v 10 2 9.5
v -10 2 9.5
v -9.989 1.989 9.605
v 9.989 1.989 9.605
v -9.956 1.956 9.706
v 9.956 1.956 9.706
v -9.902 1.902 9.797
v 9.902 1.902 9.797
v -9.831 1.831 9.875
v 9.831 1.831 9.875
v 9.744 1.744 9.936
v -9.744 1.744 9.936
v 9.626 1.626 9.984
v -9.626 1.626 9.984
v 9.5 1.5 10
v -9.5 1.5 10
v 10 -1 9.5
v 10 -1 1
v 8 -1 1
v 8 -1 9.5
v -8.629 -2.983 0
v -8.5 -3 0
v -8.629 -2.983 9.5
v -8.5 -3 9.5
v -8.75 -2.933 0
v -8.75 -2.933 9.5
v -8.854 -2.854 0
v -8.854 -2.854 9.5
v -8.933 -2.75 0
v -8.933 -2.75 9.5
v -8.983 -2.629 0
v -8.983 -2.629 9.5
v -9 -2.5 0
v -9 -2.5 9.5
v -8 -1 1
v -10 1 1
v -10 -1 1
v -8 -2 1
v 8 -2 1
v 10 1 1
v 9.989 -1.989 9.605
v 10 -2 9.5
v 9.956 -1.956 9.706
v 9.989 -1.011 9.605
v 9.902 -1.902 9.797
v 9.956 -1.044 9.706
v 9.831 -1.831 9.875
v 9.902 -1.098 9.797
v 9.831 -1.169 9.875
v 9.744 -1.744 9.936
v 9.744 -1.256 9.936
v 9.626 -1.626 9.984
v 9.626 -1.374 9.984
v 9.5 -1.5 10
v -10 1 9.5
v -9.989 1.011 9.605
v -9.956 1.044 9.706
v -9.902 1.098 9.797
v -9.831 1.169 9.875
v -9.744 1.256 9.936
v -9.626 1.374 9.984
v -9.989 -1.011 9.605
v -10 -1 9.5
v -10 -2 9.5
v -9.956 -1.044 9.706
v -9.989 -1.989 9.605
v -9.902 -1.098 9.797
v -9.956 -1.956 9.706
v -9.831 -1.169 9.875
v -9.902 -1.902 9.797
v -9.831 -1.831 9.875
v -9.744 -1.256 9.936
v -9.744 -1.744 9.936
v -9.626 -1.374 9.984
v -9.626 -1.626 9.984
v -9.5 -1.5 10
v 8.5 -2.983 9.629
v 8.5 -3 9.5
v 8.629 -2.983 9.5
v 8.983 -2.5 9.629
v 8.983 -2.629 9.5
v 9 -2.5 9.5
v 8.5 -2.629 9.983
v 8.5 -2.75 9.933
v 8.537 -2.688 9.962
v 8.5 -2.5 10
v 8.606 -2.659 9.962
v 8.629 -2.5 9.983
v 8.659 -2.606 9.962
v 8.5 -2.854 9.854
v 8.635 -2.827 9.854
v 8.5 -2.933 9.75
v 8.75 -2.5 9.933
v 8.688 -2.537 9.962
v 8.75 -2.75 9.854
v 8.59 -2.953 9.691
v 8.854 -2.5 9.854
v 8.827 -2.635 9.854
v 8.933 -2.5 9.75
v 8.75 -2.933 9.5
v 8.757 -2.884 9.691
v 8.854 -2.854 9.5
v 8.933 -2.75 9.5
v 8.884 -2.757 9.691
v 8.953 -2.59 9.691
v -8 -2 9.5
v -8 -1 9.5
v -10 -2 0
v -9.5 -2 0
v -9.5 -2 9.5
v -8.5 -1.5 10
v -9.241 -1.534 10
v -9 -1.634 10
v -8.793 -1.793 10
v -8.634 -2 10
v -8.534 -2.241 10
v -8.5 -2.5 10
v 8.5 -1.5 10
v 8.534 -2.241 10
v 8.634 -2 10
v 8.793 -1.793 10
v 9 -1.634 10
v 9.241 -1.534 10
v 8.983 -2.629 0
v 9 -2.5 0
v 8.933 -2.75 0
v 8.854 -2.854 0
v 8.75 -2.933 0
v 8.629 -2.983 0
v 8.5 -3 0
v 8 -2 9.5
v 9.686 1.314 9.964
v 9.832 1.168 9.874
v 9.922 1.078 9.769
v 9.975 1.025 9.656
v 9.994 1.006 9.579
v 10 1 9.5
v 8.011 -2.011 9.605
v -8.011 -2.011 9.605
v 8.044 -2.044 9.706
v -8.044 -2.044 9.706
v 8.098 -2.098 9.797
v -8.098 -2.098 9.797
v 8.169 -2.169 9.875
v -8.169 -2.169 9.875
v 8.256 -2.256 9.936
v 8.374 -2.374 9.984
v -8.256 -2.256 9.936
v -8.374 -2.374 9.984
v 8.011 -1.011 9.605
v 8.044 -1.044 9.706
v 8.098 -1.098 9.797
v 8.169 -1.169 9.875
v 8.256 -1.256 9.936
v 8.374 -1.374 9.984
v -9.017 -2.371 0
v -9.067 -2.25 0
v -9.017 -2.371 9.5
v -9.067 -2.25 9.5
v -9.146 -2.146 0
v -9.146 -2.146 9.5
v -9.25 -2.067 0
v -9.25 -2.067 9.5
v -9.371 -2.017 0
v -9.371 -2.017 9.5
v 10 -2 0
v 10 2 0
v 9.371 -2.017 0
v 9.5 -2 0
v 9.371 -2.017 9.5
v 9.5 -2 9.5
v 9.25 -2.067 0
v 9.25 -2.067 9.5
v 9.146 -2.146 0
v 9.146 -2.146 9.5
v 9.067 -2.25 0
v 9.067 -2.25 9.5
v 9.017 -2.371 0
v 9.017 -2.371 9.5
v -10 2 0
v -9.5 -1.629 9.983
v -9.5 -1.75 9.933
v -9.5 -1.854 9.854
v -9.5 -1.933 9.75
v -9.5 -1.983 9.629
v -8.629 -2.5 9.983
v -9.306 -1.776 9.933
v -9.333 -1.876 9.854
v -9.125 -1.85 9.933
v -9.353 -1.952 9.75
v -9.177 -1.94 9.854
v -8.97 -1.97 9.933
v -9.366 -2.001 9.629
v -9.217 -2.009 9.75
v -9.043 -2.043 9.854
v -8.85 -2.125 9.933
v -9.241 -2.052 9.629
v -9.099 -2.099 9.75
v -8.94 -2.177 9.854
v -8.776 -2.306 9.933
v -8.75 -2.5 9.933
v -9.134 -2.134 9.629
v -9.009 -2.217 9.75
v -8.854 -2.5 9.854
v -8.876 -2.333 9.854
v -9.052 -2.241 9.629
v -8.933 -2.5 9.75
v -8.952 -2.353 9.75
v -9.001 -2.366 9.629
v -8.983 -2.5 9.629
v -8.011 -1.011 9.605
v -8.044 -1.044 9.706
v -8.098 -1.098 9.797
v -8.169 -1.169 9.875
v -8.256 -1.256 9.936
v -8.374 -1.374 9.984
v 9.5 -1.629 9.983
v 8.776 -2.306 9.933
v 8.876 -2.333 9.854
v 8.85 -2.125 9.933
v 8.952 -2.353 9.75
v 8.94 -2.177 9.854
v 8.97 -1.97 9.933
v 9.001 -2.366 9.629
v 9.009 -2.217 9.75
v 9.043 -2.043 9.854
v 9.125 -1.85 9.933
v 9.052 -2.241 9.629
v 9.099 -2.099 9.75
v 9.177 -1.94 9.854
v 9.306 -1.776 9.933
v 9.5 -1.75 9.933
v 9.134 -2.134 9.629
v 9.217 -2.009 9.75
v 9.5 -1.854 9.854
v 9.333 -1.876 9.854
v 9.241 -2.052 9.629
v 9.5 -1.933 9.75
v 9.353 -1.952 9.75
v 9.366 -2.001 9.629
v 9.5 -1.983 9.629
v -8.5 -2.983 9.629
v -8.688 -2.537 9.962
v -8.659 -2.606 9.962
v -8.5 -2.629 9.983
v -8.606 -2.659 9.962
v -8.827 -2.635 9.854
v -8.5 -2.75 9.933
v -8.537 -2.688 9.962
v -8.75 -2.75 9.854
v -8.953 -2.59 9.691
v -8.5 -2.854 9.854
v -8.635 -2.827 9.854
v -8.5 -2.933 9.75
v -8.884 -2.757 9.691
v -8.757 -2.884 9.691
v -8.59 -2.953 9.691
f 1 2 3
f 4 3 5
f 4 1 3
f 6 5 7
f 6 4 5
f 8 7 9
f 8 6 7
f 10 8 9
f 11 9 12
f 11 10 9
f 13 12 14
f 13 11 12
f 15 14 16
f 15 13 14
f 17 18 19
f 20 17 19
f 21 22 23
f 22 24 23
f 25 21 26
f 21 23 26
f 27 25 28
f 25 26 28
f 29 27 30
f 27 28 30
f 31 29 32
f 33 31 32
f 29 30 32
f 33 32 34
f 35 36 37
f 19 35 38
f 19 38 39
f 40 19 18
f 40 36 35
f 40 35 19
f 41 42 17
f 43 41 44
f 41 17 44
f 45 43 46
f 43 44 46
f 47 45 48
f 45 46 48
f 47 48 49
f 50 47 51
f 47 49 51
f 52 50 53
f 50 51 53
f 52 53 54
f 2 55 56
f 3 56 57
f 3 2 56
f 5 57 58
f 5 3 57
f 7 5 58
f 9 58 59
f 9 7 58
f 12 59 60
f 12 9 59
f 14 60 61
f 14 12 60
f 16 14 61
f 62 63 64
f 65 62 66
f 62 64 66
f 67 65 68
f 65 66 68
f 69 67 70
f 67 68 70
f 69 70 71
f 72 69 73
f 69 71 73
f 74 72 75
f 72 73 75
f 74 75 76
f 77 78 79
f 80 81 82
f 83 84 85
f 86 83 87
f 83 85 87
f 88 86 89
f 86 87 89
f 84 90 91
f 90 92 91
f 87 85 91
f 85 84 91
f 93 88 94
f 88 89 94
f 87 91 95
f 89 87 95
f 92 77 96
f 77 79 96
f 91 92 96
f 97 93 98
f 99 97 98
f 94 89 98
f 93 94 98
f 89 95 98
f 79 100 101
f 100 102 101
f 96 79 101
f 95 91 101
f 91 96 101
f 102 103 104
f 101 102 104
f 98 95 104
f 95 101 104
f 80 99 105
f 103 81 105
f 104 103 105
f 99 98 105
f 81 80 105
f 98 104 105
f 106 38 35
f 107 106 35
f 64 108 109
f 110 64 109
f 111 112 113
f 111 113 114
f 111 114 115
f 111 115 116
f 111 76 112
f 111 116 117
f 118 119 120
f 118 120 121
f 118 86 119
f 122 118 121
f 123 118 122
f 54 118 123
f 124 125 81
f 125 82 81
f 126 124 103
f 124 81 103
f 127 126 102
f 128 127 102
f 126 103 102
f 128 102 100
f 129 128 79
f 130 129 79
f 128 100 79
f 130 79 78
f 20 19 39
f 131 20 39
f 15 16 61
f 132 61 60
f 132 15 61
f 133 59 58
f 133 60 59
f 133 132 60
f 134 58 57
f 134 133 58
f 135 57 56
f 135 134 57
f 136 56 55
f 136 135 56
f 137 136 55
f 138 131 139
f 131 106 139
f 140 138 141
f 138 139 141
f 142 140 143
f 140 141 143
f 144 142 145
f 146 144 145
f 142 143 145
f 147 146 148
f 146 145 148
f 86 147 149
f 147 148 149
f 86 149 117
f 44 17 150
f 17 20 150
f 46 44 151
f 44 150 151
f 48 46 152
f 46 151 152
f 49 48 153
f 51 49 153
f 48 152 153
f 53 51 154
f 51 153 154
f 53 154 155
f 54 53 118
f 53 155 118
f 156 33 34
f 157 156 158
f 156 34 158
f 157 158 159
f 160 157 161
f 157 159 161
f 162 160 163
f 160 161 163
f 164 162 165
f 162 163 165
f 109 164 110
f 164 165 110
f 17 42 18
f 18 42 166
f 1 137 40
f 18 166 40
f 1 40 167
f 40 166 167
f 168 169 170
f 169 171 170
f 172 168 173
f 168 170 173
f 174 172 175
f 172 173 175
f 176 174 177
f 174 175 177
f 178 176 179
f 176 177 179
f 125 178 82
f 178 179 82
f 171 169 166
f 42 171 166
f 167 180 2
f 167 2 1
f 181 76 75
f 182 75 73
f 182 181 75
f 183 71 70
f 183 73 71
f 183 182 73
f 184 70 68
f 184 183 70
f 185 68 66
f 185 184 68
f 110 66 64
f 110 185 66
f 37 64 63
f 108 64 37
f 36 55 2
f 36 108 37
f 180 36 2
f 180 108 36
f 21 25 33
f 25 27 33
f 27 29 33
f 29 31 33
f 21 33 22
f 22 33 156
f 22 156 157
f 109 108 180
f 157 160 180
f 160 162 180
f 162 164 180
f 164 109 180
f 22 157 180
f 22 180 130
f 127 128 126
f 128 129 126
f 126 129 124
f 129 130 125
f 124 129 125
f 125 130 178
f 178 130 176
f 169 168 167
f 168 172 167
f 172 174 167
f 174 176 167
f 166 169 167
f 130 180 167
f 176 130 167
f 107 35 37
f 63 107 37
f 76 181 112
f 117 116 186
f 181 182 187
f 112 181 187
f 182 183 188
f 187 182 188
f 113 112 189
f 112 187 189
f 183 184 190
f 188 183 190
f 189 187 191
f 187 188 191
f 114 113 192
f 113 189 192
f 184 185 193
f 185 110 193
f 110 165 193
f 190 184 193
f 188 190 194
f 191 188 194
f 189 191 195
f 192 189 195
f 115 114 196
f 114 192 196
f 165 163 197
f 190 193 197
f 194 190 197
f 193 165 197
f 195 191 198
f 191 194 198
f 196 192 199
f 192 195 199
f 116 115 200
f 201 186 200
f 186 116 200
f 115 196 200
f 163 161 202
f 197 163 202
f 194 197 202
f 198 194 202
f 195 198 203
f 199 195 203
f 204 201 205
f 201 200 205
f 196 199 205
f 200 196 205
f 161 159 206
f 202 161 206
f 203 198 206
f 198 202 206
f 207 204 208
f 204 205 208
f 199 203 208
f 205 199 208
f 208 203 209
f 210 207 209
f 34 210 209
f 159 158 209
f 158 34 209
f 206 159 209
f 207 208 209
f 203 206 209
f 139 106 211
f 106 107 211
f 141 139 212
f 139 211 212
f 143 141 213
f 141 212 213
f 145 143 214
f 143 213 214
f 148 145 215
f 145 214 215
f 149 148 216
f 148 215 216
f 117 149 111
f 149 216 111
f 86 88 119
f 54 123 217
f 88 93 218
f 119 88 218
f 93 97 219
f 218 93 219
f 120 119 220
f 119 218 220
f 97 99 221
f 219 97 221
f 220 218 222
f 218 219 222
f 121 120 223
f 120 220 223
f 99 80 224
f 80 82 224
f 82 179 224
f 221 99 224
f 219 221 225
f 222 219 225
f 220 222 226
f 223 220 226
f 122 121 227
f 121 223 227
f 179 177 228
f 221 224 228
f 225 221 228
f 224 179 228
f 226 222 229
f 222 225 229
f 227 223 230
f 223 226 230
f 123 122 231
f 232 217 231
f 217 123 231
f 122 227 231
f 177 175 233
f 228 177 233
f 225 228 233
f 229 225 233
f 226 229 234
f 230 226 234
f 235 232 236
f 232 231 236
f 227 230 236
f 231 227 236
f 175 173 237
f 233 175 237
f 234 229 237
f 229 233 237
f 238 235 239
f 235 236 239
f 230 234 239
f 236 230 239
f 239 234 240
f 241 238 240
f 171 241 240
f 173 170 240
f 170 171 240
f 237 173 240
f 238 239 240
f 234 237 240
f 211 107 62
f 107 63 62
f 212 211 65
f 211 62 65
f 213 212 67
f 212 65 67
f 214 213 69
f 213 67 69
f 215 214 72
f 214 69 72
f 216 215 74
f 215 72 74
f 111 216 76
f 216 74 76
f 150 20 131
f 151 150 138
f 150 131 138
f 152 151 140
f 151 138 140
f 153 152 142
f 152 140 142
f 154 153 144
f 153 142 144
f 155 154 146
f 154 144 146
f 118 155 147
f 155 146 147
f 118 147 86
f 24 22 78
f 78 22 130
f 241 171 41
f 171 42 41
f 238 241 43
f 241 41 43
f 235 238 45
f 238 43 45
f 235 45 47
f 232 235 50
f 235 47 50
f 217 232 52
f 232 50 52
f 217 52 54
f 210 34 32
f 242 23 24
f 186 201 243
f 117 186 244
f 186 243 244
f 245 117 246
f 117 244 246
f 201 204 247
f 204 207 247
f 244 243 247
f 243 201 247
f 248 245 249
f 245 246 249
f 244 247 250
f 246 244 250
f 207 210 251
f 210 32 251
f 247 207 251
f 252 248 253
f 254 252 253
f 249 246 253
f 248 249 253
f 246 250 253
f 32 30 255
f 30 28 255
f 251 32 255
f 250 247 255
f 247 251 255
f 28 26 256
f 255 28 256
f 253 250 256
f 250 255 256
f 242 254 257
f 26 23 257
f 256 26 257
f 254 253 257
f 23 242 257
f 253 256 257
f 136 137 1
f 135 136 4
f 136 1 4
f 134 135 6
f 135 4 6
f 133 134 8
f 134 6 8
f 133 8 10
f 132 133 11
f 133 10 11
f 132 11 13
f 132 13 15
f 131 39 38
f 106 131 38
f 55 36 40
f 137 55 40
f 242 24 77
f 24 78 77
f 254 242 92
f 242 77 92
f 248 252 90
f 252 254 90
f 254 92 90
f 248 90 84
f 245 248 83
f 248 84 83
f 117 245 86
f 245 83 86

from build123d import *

# Parameters (mm, degrees)
F0_W     = 16
F0_H     = 1
F1_DEPTH = 1
F0_W_2   = 20
F2_DEPTH = 10
F3_R     = 0.49999


# Not quite as in the source:
# - a fillet or chamfer is up to 0.001 mm smaller than in the source, because OpenCascade refuses the exact size


with BuildPart() as f1:
    # F0 (on Top) → F1 (new body)
    with BuildSketch(Plane.XY):
        Polygon((10, 1), (-10, 1), (-10, -1), (-8, -1), (8, -1), (10, -1), align=None)
        with Locations((0, -1.5)):
            Rectangle(F0_W, F0_H)
    extrude(amount=F1_DEPTH)

    # F0 (on Top) → F2 (join)
    with BuildSketch(Plane.XY):
        with Locations((0, 1.5)):
            Rectangle(F0_W_2, F0_H)
        Polygon((-8, -1), (-10, -1), (-10, -2), (-9, -2), (-8, -2), align=None)
        Polygon((8, -2), (-8, -2), (-9, -2), (-9, -3), (9, -3), (9, -2), align=None)
        Polygon((10, -2), (10, -1), (8, -1), (8, -2), (9, -2), align=None)
    extrude(amount=F2_DEPTH)

    # F3 (radius 0.5 in the source; OpenCascade refuses exactly that, so slightly less here)
    f3_edges = [f1.edges().sort_by_distance(p)[0] for p in [
        (-9, -2, 5),
        (-9, -3, 5),
        (9, -2, 5),
        (9, -3, 5),
        (-9, -1, 10),
        (-10, -1.5, 10),
        (-9.5, -2, 10),
        (-9, -2.5, 10),
        (0, -3, 10),
        (9, -2.5, 10),
        (9.5, -2, 10),
        (10, -1.5, 10),
        (9, -1, 10),
        (8, -1.5, 10),
        (0, -2, 10),
        (-8, -1.5, 10),
        (-10, 1.5, 10),
        (0, 1, 10),
        (10, 1.5, 10),
        (0, 2, 10),
    ]]
    fillet(f3_edges, radius=F3_R)


solid = f1.part
